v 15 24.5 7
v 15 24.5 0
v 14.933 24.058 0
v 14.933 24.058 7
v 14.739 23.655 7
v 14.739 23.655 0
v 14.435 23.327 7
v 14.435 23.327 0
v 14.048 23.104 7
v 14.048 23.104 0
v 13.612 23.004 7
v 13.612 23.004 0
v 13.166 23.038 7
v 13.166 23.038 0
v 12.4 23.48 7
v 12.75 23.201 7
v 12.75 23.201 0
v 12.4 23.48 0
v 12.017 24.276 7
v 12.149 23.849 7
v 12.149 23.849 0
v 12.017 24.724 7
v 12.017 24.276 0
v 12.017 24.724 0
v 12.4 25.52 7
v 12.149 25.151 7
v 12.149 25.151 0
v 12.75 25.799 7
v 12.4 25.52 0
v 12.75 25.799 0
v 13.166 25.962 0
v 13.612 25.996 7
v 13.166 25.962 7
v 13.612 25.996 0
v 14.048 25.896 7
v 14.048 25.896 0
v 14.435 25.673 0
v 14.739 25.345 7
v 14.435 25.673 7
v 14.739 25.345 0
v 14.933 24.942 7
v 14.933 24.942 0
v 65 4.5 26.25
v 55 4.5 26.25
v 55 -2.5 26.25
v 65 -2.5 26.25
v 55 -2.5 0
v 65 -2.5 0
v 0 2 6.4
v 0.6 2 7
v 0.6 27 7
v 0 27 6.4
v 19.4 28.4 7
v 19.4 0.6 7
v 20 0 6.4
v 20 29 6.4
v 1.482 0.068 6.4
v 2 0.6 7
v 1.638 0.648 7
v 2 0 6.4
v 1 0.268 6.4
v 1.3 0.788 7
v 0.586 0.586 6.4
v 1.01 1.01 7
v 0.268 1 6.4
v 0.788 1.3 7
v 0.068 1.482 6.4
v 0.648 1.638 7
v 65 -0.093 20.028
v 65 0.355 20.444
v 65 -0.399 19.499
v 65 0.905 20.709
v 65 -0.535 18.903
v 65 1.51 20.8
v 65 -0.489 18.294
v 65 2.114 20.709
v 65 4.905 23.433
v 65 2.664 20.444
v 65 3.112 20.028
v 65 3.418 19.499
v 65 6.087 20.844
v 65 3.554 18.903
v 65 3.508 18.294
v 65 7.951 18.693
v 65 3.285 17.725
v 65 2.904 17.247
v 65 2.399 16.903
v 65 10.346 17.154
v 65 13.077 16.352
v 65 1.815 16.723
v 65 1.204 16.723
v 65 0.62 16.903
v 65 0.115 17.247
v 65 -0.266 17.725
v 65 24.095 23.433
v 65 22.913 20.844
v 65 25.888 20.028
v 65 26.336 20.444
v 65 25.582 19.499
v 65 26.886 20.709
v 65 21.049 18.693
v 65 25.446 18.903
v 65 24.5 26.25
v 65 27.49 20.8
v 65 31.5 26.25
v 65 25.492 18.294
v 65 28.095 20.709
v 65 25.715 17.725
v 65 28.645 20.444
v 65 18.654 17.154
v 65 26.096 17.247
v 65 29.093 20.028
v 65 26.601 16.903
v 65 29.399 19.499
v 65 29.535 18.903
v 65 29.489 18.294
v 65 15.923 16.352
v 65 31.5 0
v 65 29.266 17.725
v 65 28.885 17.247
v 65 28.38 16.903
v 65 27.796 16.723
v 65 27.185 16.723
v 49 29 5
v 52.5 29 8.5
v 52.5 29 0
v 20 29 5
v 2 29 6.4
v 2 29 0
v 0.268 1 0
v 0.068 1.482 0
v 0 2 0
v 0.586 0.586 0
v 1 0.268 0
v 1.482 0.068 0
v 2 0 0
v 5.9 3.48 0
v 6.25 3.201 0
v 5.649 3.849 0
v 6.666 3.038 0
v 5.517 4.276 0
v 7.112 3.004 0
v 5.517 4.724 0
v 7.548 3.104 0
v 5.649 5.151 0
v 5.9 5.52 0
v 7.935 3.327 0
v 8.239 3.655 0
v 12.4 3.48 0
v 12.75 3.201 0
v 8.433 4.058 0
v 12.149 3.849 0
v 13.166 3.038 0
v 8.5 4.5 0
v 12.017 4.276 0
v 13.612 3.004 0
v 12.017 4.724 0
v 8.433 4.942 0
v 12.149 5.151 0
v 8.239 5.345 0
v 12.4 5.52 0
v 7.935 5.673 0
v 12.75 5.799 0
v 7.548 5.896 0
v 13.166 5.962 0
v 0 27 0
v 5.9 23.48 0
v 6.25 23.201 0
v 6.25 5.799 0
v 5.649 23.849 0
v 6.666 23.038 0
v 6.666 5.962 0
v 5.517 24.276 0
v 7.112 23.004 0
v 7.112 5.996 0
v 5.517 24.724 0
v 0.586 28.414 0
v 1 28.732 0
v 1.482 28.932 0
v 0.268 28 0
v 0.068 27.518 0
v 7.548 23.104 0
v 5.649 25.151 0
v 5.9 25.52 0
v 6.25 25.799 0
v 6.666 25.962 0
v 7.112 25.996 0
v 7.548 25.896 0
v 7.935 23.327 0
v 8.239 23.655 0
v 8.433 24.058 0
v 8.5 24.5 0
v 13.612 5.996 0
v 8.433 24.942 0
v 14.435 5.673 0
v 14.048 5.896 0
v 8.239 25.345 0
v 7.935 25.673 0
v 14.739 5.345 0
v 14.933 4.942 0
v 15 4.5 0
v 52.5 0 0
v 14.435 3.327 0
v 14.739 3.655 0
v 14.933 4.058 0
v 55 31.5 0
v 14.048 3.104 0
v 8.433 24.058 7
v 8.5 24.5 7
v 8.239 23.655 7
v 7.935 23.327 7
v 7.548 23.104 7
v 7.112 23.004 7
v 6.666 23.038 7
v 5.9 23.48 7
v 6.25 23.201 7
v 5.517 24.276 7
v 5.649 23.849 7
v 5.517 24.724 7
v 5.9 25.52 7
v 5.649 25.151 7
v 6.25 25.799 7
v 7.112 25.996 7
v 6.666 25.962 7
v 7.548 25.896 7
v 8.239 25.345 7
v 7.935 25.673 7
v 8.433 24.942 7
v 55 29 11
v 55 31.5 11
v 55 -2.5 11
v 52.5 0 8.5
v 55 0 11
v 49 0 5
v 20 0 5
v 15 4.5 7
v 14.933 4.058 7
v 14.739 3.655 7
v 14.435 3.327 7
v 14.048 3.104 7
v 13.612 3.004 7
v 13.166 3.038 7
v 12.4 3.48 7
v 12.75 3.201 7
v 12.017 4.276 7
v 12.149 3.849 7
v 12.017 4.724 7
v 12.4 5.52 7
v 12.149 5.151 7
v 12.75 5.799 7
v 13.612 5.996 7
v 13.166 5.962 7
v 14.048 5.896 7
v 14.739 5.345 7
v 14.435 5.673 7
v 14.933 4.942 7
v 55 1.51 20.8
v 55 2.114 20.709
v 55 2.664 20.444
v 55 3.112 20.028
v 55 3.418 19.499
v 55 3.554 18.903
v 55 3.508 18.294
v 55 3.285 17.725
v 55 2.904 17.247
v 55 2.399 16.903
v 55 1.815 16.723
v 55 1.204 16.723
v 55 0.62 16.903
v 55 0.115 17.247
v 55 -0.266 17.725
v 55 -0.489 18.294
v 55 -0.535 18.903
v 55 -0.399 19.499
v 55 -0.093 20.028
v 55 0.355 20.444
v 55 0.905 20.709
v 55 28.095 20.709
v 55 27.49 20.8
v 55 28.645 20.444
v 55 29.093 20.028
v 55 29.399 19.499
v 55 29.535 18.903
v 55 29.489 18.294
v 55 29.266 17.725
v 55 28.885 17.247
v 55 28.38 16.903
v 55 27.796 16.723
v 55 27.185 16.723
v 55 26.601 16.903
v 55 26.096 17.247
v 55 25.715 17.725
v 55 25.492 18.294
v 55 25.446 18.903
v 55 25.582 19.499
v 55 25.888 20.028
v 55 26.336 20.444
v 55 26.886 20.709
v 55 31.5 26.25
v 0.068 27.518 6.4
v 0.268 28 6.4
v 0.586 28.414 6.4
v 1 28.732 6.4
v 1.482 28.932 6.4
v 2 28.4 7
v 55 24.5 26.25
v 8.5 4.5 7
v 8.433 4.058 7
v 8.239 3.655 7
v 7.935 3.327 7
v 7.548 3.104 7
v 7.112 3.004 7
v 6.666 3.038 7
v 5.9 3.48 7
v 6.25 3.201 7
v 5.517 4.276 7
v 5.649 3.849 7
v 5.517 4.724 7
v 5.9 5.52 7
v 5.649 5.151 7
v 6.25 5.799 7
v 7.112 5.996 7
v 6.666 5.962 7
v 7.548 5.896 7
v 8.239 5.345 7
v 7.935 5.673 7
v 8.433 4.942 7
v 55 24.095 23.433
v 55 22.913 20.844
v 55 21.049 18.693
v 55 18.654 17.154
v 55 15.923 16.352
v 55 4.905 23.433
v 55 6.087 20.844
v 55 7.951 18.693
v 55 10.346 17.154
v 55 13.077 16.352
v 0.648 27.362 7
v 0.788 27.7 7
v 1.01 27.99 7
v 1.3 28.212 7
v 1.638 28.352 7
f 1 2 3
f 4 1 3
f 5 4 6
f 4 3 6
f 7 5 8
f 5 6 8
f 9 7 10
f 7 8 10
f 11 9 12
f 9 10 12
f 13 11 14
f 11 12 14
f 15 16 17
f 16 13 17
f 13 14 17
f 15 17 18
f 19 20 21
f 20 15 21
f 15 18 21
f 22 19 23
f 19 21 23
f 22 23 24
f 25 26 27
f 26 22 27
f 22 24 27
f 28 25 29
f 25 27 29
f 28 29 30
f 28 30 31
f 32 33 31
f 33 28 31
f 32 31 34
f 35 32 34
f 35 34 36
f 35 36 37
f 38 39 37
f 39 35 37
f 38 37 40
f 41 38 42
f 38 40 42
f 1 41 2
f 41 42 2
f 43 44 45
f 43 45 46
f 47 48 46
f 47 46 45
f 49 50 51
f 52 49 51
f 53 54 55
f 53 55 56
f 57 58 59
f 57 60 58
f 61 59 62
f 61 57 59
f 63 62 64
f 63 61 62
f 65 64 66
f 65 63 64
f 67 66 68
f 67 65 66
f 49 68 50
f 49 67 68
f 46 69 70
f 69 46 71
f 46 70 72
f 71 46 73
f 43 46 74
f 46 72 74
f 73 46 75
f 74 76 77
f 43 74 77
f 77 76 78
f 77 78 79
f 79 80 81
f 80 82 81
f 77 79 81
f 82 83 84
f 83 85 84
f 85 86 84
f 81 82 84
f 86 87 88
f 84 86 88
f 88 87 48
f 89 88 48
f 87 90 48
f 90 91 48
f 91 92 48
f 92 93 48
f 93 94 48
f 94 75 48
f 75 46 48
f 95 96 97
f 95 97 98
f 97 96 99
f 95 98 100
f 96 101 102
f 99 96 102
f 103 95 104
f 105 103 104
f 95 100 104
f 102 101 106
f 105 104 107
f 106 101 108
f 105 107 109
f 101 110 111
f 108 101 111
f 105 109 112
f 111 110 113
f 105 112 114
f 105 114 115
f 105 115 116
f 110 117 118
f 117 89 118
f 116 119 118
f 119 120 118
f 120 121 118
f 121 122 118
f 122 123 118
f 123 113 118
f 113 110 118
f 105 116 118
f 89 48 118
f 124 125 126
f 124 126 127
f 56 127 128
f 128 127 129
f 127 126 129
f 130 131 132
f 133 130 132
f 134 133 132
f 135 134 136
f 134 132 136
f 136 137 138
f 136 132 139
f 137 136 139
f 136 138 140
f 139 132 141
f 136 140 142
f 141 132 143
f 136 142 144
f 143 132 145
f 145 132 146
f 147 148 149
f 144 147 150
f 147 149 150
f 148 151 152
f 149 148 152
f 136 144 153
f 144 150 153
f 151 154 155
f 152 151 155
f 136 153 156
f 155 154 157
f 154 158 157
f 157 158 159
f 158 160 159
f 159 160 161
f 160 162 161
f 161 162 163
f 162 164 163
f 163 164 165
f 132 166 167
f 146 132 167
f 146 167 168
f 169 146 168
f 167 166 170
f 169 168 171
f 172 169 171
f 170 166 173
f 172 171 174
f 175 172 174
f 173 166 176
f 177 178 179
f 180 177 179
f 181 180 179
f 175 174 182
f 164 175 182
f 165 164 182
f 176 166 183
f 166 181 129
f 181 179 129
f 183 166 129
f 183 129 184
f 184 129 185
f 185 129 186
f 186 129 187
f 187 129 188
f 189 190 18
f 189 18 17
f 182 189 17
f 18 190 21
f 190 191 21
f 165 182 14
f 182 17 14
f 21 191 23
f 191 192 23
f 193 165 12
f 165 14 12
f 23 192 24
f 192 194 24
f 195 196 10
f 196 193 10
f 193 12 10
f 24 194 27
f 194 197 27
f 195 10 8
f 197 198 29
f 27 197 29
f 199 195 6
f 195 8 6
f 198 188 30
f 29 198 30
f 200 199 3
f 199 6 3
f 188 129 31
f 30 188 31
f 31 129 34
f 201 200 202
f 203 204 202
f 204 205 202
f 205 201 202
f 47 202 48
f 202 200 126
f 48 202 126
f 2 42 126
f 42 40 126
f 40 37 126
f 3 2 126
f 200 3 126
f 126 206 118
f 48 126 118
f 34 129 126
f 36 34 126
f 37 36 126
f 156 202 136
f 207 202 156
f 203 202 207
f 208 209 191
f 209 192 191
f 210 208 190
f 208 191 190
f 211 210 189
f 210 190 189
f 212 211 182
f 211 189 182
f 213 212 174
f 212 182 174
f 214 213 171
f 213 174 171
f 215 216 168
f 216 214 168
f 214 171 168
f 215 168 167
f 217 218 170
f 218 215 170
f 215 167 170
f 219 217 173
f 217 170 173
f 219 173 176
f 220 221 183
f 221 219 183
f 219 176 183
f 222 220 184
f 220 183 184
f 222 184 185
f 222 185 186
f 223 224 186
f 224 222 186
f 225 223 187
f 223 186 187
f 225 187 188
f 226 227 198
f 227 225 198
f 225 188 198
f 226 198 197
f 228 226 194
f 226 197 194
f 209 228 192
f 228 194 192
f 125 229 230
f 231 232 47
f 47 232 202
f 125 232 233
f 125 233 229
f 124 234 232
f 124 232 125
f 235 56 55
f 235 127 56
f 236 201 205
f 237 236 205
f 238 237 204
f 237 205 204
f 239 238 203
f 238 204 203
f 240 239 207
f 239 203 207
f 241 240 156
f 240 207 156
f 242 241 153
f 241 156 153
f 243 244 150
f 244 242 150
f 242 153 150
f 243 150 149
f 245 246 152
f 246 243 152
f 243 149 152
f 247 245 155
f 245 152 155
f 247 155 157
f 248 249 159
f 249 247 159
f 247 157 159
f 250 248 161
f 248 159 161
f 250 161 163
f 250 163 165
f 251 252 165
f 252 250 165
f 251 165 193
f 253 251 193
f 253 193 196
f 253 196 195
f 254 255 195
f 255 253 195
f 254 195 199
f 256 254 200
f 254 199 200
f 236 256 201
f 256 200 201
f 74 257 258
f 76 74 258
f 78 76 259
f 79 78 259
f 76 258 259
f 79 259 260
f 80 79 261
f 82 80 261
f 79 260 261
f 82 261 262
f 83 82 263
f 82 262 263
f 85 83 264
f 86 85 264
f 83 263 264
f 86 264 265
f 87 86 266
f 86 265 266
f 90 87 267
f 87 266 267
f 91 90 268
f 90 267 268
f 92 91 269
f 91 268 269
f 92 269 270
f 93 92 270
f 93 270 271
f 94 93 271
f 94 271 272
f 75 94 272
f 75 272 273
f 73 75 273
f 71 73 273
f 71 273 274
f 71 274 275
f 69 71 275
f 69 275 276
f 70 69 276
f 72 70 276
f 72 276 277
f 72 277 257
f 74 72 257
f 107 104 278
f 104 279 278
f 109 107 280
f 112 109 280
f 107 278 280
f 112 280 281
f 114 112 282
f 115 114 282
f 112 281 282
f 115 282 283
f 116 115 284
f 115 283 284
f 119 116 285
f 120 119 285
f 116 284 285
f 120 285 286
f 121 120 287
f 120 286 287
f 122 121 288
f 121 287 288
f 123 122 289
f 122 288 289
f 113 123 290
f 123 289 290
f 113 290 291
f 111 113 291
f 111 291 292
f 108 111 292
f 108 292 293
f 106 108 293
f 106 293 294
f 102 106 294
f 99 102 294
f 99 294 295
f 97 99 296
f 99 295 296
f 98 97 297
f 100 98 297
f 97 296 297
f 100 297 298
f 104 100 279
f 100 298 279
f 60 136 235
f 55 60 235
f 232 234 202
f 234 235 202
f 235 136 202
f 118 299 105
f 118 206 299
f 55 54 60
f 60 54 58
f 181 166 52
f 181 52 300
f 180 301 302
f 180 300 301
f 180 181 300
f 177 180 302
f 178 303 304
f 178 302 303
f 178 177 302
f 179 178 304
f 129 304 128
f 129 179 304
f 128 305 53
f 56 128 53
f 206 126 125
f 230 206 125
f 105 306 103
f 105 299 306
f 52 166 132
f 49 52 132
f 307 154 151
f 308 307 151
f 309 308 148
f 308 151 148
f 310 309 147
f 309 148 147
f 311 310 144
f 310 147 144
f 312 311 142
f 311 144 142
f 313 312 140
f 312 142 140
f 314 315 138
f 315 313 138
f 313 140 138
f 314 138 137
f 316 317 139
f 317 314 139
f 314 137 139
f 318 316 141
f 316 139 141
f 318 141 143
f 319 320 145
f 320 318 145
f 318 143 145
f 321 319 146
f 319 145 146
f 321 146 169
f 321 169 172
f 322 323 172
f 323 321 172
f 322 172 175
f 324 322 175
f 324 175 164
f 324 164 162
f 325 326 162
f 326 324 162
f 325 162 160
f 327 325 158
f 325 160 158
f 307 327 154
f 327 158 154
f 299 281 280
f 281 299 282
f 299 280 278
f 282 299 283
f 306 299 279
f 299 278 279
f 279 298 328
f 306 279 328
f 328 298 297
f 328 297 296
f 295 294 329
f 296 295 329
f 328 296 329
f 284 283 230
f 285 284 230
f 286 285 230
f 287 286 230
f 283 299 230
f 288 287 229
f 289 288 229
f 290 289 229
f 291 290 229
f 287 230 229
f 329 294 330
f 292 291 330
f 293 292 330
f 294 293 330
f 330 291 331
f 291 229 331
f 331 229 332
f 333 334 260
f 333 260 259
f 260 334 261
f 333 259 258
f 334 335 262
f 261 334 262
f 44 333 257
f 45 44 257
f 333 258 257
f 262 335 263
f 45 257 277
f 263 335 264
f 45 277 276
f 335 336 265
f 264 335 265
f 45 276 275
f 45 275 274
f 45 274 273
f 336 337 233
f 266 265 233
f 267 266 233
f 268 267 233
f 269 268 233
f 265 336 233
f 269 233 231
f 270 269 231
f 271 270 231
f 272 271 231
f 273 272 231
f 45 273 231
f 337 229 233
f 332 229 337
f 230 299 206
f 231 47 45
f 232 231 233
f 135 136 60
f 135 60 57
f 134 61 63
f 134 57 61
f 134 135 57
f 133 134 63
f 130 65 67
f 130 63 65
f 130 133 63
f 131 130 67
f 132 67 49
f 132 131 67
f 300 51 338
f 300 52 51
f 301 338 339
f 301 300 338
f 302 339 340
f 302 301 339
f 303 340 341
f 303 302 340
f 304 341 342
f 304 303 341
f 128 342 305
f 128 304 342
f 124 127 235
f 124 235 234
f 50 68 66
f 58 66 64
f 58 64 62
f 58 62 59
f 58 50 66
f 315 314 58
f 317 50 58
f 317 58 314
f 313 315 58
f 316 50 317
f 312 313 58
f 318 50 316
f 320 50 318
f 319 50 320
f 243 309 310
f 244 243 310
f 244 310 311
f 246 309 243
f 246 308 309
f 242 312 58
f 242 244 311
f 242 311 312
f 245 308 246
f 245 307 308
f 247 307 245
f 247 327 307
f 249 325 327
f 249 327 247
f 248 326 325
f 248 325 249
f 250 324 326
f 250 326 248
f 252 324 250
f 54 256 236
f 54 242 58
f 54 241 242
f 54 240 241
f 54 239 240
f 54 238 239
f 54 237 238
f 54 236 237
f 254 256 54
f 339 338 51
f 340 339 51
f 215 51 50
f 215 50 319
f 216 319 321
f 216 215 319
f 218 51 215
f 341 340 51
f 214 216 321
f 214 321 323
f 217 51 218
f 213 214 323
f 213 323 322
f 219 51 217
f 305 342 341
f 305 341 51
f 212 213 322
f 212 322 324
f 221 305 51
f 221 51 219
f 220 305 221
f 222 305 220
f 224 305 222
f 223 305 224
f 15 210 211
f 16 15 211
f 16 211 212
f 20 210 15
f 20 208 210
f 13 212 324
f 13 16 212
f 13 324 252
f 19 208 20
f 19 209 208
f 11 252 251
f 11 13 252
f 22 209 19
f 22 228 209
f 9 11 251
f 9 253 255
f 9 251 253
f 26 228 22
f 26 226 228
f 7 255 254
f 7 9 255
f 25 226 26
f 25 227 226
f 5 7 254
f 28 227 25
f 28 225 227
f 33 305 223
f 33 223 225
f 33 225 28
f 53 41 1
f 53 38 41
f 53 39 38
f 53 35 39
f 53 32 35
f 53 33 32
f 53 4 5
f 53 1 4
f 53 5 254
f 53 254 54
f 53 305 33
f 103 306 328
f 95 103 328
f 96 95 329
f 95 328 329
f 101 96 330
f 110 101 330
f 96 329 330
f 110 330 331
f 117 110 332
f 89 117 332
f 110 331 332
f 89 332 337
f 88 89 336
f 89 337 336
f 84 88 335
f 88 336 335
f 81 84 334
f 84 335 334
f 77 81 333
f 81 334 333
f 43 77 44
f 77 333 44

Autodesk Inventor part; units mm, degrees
ref_plane "YZ Plane" through (0, 0, 0) normal (1, 0, 0) x (0, 1, 0)
ref_plane "XZ Plane" through (0, 0, 0) normal (0, 1, 0) x (-1, 0, 0)
ref_plane "XY Plane" through (0, 0, 0) normal (0, 0, 1) x (1, 0, 0)
sketch "Sketch1" plane through (0, 0, 0) normal (0, 0, 1) x (1, 0, 0)
  line L0 (2, 0) -> (65, 0)
  line L1 (65, 0) -> (65, 29)
  line L2 (65, 29) -> (2, 29)
  line L3 (0, 27) -> (0, 2)
  arc A0 (2, 29) -> (0, 27) centre (2, 27) ccw
  arc A1 (0, 2) -> (2, 0) centre (2, 2) ccw
  line L4 (20, 29) -> (20, 0)
  line L5 (55, 29) -> (55, 0)
  circle A2 centre (7, 24.5) radius 1.5
  circle A3 centre (7, 4.5) radius 1.5
  circle A4 centre (13.5, 24.5) radius 1.5
  circle A5 centre (13.5, 4.5) radius 1.5
  line L6 (65, 0) -> (65, -2.5)
  line L7 (65, -2.5) -> (55, -2.5)
  line L8 (55, -2.5) -> (55, 0)
  line L9 (55, 29) -> (55, 31.5)
  line L10 (55, 31.5) -> (65, 31.5)
  line L11 (65, 31.5) -> (65, 29)
  point P0 (0, 0)
  point P1 (0, 29)
  dimension "d0" = 65
  dimension "d1" = 29
  dimension "d2" = 2
  dimension "d3" = 20
  dimension "d4" = 10
  dimension "d5" = 3
  dimension "d6" = 3
  dimension "d7" = 4.5
  dimension "d8" = 4.5
  dimension "d9" = 20
  dimension "d10" = 3
  dimension "d11" = 3
  dimension "d12" = 20
  dimension "d13" = 6.5
  dimension "d14" = 7
  dimension "d24" = 2.5
  dimension "d25" = 2.5
extrude "Extrusion1" add sketch "Sketch1" along normal blind 5 contours L4 L2 L5 L0
extrude "Extrusion2" add sketch "Sketch1" along normal blind 7 contours A1 L3 A0 L2 L4 L0
extrude "Extrusion3" add sketch "Sketch1" along normal blind 26.25 contours L5 L2 L1 L0
sketch "Sketch2" plane through (55, 0, 5) normal (-1, 0, 0) x (0, 0, 1)
  line L0 (21.25, 29) -> (21.25, 0) projected
  circle A0 centre (21.25, 14.5) radius 10
  point P0 (-5, 0)
  point P1 (21.25, 4.5)
  point P2 (21.25, 24.5)
  dimension "d21" = 20
extrude "Extrusion4" cut sketch "Sketch2" against normal blind 20 contours L0 A0 picked at (15.0351, 13.318)
extrude "Extrusion5" add sketch "Sketch1" along normal blind 26.25 contours L0 L6 L7 L8 | L9 L10 L11 L2
sketch "Sketch4" plane through (55, 0, 5) normal (-1, 0, 0) x (0, 0, 1)
  circle A0 centre (13.75, 1.5095) radius 2.05
  circle A1 centre (13.75, 27.4905) radius 2.05
  line L0 (-5, -2.5) -> (21.25, -2.5) projected
  line L1 (-5, 31.5) -> (21.25, 31.5) projected
  line L2 (21.25, 31.5) -> (21.25, 24.5) projected
  point P0 (-5, 0)
  point P1 (8.125, -2.5)
  dimension "d28" = 4.1
  dimension "d29" = 4.1
  dimension "d30" = 25.981
  dimension "d31" = 4.0095
  dimension "d32" = 4.0095
  dimension "d33" = 7.5
extrude "Extrusion6" cut sketch "Sketch4" against normal blind 26.25
chamfer "Chamfer1" distance 2.5 angle 45 1 edges at (55, 0, 2.5)
chamfer "Chamfer2" distance 2.5 angle 45 1 edges at (55, 29, 2.5)
chamfer "Chamfer3" distance 6 angle 45 1 edges at (55, 14.5, 5)
chamfer "Chamfer4" distance 0.6 angle 45 6 edges at (20, 14.5, 7) (11, 0, 7) (0.5858, 0.5858, 7) (0, 14.5, 7) (0.5858, 28.4142, 7) (11, 29, 7)
equation "\"BendRadius\" = Thickness"
equation "\"BendReliefWidth\" = Thickness"
equation "\"BendReliefDepth\" = 0.5 * Thickness"
equation "\"CornerReliefSize\" = 4 * Thickness"
equation "\"MinimumRemnant\" = 2 * Thickness"
equation "\"TransitionRadius\" = BendRadius"
equation "\"JacobiRadiusSize\" = BendRadius"
equation "\"GapSize\" = Thickness"
equation "\"Thickness\" = 0.5"
properties part number "tool4_1"
